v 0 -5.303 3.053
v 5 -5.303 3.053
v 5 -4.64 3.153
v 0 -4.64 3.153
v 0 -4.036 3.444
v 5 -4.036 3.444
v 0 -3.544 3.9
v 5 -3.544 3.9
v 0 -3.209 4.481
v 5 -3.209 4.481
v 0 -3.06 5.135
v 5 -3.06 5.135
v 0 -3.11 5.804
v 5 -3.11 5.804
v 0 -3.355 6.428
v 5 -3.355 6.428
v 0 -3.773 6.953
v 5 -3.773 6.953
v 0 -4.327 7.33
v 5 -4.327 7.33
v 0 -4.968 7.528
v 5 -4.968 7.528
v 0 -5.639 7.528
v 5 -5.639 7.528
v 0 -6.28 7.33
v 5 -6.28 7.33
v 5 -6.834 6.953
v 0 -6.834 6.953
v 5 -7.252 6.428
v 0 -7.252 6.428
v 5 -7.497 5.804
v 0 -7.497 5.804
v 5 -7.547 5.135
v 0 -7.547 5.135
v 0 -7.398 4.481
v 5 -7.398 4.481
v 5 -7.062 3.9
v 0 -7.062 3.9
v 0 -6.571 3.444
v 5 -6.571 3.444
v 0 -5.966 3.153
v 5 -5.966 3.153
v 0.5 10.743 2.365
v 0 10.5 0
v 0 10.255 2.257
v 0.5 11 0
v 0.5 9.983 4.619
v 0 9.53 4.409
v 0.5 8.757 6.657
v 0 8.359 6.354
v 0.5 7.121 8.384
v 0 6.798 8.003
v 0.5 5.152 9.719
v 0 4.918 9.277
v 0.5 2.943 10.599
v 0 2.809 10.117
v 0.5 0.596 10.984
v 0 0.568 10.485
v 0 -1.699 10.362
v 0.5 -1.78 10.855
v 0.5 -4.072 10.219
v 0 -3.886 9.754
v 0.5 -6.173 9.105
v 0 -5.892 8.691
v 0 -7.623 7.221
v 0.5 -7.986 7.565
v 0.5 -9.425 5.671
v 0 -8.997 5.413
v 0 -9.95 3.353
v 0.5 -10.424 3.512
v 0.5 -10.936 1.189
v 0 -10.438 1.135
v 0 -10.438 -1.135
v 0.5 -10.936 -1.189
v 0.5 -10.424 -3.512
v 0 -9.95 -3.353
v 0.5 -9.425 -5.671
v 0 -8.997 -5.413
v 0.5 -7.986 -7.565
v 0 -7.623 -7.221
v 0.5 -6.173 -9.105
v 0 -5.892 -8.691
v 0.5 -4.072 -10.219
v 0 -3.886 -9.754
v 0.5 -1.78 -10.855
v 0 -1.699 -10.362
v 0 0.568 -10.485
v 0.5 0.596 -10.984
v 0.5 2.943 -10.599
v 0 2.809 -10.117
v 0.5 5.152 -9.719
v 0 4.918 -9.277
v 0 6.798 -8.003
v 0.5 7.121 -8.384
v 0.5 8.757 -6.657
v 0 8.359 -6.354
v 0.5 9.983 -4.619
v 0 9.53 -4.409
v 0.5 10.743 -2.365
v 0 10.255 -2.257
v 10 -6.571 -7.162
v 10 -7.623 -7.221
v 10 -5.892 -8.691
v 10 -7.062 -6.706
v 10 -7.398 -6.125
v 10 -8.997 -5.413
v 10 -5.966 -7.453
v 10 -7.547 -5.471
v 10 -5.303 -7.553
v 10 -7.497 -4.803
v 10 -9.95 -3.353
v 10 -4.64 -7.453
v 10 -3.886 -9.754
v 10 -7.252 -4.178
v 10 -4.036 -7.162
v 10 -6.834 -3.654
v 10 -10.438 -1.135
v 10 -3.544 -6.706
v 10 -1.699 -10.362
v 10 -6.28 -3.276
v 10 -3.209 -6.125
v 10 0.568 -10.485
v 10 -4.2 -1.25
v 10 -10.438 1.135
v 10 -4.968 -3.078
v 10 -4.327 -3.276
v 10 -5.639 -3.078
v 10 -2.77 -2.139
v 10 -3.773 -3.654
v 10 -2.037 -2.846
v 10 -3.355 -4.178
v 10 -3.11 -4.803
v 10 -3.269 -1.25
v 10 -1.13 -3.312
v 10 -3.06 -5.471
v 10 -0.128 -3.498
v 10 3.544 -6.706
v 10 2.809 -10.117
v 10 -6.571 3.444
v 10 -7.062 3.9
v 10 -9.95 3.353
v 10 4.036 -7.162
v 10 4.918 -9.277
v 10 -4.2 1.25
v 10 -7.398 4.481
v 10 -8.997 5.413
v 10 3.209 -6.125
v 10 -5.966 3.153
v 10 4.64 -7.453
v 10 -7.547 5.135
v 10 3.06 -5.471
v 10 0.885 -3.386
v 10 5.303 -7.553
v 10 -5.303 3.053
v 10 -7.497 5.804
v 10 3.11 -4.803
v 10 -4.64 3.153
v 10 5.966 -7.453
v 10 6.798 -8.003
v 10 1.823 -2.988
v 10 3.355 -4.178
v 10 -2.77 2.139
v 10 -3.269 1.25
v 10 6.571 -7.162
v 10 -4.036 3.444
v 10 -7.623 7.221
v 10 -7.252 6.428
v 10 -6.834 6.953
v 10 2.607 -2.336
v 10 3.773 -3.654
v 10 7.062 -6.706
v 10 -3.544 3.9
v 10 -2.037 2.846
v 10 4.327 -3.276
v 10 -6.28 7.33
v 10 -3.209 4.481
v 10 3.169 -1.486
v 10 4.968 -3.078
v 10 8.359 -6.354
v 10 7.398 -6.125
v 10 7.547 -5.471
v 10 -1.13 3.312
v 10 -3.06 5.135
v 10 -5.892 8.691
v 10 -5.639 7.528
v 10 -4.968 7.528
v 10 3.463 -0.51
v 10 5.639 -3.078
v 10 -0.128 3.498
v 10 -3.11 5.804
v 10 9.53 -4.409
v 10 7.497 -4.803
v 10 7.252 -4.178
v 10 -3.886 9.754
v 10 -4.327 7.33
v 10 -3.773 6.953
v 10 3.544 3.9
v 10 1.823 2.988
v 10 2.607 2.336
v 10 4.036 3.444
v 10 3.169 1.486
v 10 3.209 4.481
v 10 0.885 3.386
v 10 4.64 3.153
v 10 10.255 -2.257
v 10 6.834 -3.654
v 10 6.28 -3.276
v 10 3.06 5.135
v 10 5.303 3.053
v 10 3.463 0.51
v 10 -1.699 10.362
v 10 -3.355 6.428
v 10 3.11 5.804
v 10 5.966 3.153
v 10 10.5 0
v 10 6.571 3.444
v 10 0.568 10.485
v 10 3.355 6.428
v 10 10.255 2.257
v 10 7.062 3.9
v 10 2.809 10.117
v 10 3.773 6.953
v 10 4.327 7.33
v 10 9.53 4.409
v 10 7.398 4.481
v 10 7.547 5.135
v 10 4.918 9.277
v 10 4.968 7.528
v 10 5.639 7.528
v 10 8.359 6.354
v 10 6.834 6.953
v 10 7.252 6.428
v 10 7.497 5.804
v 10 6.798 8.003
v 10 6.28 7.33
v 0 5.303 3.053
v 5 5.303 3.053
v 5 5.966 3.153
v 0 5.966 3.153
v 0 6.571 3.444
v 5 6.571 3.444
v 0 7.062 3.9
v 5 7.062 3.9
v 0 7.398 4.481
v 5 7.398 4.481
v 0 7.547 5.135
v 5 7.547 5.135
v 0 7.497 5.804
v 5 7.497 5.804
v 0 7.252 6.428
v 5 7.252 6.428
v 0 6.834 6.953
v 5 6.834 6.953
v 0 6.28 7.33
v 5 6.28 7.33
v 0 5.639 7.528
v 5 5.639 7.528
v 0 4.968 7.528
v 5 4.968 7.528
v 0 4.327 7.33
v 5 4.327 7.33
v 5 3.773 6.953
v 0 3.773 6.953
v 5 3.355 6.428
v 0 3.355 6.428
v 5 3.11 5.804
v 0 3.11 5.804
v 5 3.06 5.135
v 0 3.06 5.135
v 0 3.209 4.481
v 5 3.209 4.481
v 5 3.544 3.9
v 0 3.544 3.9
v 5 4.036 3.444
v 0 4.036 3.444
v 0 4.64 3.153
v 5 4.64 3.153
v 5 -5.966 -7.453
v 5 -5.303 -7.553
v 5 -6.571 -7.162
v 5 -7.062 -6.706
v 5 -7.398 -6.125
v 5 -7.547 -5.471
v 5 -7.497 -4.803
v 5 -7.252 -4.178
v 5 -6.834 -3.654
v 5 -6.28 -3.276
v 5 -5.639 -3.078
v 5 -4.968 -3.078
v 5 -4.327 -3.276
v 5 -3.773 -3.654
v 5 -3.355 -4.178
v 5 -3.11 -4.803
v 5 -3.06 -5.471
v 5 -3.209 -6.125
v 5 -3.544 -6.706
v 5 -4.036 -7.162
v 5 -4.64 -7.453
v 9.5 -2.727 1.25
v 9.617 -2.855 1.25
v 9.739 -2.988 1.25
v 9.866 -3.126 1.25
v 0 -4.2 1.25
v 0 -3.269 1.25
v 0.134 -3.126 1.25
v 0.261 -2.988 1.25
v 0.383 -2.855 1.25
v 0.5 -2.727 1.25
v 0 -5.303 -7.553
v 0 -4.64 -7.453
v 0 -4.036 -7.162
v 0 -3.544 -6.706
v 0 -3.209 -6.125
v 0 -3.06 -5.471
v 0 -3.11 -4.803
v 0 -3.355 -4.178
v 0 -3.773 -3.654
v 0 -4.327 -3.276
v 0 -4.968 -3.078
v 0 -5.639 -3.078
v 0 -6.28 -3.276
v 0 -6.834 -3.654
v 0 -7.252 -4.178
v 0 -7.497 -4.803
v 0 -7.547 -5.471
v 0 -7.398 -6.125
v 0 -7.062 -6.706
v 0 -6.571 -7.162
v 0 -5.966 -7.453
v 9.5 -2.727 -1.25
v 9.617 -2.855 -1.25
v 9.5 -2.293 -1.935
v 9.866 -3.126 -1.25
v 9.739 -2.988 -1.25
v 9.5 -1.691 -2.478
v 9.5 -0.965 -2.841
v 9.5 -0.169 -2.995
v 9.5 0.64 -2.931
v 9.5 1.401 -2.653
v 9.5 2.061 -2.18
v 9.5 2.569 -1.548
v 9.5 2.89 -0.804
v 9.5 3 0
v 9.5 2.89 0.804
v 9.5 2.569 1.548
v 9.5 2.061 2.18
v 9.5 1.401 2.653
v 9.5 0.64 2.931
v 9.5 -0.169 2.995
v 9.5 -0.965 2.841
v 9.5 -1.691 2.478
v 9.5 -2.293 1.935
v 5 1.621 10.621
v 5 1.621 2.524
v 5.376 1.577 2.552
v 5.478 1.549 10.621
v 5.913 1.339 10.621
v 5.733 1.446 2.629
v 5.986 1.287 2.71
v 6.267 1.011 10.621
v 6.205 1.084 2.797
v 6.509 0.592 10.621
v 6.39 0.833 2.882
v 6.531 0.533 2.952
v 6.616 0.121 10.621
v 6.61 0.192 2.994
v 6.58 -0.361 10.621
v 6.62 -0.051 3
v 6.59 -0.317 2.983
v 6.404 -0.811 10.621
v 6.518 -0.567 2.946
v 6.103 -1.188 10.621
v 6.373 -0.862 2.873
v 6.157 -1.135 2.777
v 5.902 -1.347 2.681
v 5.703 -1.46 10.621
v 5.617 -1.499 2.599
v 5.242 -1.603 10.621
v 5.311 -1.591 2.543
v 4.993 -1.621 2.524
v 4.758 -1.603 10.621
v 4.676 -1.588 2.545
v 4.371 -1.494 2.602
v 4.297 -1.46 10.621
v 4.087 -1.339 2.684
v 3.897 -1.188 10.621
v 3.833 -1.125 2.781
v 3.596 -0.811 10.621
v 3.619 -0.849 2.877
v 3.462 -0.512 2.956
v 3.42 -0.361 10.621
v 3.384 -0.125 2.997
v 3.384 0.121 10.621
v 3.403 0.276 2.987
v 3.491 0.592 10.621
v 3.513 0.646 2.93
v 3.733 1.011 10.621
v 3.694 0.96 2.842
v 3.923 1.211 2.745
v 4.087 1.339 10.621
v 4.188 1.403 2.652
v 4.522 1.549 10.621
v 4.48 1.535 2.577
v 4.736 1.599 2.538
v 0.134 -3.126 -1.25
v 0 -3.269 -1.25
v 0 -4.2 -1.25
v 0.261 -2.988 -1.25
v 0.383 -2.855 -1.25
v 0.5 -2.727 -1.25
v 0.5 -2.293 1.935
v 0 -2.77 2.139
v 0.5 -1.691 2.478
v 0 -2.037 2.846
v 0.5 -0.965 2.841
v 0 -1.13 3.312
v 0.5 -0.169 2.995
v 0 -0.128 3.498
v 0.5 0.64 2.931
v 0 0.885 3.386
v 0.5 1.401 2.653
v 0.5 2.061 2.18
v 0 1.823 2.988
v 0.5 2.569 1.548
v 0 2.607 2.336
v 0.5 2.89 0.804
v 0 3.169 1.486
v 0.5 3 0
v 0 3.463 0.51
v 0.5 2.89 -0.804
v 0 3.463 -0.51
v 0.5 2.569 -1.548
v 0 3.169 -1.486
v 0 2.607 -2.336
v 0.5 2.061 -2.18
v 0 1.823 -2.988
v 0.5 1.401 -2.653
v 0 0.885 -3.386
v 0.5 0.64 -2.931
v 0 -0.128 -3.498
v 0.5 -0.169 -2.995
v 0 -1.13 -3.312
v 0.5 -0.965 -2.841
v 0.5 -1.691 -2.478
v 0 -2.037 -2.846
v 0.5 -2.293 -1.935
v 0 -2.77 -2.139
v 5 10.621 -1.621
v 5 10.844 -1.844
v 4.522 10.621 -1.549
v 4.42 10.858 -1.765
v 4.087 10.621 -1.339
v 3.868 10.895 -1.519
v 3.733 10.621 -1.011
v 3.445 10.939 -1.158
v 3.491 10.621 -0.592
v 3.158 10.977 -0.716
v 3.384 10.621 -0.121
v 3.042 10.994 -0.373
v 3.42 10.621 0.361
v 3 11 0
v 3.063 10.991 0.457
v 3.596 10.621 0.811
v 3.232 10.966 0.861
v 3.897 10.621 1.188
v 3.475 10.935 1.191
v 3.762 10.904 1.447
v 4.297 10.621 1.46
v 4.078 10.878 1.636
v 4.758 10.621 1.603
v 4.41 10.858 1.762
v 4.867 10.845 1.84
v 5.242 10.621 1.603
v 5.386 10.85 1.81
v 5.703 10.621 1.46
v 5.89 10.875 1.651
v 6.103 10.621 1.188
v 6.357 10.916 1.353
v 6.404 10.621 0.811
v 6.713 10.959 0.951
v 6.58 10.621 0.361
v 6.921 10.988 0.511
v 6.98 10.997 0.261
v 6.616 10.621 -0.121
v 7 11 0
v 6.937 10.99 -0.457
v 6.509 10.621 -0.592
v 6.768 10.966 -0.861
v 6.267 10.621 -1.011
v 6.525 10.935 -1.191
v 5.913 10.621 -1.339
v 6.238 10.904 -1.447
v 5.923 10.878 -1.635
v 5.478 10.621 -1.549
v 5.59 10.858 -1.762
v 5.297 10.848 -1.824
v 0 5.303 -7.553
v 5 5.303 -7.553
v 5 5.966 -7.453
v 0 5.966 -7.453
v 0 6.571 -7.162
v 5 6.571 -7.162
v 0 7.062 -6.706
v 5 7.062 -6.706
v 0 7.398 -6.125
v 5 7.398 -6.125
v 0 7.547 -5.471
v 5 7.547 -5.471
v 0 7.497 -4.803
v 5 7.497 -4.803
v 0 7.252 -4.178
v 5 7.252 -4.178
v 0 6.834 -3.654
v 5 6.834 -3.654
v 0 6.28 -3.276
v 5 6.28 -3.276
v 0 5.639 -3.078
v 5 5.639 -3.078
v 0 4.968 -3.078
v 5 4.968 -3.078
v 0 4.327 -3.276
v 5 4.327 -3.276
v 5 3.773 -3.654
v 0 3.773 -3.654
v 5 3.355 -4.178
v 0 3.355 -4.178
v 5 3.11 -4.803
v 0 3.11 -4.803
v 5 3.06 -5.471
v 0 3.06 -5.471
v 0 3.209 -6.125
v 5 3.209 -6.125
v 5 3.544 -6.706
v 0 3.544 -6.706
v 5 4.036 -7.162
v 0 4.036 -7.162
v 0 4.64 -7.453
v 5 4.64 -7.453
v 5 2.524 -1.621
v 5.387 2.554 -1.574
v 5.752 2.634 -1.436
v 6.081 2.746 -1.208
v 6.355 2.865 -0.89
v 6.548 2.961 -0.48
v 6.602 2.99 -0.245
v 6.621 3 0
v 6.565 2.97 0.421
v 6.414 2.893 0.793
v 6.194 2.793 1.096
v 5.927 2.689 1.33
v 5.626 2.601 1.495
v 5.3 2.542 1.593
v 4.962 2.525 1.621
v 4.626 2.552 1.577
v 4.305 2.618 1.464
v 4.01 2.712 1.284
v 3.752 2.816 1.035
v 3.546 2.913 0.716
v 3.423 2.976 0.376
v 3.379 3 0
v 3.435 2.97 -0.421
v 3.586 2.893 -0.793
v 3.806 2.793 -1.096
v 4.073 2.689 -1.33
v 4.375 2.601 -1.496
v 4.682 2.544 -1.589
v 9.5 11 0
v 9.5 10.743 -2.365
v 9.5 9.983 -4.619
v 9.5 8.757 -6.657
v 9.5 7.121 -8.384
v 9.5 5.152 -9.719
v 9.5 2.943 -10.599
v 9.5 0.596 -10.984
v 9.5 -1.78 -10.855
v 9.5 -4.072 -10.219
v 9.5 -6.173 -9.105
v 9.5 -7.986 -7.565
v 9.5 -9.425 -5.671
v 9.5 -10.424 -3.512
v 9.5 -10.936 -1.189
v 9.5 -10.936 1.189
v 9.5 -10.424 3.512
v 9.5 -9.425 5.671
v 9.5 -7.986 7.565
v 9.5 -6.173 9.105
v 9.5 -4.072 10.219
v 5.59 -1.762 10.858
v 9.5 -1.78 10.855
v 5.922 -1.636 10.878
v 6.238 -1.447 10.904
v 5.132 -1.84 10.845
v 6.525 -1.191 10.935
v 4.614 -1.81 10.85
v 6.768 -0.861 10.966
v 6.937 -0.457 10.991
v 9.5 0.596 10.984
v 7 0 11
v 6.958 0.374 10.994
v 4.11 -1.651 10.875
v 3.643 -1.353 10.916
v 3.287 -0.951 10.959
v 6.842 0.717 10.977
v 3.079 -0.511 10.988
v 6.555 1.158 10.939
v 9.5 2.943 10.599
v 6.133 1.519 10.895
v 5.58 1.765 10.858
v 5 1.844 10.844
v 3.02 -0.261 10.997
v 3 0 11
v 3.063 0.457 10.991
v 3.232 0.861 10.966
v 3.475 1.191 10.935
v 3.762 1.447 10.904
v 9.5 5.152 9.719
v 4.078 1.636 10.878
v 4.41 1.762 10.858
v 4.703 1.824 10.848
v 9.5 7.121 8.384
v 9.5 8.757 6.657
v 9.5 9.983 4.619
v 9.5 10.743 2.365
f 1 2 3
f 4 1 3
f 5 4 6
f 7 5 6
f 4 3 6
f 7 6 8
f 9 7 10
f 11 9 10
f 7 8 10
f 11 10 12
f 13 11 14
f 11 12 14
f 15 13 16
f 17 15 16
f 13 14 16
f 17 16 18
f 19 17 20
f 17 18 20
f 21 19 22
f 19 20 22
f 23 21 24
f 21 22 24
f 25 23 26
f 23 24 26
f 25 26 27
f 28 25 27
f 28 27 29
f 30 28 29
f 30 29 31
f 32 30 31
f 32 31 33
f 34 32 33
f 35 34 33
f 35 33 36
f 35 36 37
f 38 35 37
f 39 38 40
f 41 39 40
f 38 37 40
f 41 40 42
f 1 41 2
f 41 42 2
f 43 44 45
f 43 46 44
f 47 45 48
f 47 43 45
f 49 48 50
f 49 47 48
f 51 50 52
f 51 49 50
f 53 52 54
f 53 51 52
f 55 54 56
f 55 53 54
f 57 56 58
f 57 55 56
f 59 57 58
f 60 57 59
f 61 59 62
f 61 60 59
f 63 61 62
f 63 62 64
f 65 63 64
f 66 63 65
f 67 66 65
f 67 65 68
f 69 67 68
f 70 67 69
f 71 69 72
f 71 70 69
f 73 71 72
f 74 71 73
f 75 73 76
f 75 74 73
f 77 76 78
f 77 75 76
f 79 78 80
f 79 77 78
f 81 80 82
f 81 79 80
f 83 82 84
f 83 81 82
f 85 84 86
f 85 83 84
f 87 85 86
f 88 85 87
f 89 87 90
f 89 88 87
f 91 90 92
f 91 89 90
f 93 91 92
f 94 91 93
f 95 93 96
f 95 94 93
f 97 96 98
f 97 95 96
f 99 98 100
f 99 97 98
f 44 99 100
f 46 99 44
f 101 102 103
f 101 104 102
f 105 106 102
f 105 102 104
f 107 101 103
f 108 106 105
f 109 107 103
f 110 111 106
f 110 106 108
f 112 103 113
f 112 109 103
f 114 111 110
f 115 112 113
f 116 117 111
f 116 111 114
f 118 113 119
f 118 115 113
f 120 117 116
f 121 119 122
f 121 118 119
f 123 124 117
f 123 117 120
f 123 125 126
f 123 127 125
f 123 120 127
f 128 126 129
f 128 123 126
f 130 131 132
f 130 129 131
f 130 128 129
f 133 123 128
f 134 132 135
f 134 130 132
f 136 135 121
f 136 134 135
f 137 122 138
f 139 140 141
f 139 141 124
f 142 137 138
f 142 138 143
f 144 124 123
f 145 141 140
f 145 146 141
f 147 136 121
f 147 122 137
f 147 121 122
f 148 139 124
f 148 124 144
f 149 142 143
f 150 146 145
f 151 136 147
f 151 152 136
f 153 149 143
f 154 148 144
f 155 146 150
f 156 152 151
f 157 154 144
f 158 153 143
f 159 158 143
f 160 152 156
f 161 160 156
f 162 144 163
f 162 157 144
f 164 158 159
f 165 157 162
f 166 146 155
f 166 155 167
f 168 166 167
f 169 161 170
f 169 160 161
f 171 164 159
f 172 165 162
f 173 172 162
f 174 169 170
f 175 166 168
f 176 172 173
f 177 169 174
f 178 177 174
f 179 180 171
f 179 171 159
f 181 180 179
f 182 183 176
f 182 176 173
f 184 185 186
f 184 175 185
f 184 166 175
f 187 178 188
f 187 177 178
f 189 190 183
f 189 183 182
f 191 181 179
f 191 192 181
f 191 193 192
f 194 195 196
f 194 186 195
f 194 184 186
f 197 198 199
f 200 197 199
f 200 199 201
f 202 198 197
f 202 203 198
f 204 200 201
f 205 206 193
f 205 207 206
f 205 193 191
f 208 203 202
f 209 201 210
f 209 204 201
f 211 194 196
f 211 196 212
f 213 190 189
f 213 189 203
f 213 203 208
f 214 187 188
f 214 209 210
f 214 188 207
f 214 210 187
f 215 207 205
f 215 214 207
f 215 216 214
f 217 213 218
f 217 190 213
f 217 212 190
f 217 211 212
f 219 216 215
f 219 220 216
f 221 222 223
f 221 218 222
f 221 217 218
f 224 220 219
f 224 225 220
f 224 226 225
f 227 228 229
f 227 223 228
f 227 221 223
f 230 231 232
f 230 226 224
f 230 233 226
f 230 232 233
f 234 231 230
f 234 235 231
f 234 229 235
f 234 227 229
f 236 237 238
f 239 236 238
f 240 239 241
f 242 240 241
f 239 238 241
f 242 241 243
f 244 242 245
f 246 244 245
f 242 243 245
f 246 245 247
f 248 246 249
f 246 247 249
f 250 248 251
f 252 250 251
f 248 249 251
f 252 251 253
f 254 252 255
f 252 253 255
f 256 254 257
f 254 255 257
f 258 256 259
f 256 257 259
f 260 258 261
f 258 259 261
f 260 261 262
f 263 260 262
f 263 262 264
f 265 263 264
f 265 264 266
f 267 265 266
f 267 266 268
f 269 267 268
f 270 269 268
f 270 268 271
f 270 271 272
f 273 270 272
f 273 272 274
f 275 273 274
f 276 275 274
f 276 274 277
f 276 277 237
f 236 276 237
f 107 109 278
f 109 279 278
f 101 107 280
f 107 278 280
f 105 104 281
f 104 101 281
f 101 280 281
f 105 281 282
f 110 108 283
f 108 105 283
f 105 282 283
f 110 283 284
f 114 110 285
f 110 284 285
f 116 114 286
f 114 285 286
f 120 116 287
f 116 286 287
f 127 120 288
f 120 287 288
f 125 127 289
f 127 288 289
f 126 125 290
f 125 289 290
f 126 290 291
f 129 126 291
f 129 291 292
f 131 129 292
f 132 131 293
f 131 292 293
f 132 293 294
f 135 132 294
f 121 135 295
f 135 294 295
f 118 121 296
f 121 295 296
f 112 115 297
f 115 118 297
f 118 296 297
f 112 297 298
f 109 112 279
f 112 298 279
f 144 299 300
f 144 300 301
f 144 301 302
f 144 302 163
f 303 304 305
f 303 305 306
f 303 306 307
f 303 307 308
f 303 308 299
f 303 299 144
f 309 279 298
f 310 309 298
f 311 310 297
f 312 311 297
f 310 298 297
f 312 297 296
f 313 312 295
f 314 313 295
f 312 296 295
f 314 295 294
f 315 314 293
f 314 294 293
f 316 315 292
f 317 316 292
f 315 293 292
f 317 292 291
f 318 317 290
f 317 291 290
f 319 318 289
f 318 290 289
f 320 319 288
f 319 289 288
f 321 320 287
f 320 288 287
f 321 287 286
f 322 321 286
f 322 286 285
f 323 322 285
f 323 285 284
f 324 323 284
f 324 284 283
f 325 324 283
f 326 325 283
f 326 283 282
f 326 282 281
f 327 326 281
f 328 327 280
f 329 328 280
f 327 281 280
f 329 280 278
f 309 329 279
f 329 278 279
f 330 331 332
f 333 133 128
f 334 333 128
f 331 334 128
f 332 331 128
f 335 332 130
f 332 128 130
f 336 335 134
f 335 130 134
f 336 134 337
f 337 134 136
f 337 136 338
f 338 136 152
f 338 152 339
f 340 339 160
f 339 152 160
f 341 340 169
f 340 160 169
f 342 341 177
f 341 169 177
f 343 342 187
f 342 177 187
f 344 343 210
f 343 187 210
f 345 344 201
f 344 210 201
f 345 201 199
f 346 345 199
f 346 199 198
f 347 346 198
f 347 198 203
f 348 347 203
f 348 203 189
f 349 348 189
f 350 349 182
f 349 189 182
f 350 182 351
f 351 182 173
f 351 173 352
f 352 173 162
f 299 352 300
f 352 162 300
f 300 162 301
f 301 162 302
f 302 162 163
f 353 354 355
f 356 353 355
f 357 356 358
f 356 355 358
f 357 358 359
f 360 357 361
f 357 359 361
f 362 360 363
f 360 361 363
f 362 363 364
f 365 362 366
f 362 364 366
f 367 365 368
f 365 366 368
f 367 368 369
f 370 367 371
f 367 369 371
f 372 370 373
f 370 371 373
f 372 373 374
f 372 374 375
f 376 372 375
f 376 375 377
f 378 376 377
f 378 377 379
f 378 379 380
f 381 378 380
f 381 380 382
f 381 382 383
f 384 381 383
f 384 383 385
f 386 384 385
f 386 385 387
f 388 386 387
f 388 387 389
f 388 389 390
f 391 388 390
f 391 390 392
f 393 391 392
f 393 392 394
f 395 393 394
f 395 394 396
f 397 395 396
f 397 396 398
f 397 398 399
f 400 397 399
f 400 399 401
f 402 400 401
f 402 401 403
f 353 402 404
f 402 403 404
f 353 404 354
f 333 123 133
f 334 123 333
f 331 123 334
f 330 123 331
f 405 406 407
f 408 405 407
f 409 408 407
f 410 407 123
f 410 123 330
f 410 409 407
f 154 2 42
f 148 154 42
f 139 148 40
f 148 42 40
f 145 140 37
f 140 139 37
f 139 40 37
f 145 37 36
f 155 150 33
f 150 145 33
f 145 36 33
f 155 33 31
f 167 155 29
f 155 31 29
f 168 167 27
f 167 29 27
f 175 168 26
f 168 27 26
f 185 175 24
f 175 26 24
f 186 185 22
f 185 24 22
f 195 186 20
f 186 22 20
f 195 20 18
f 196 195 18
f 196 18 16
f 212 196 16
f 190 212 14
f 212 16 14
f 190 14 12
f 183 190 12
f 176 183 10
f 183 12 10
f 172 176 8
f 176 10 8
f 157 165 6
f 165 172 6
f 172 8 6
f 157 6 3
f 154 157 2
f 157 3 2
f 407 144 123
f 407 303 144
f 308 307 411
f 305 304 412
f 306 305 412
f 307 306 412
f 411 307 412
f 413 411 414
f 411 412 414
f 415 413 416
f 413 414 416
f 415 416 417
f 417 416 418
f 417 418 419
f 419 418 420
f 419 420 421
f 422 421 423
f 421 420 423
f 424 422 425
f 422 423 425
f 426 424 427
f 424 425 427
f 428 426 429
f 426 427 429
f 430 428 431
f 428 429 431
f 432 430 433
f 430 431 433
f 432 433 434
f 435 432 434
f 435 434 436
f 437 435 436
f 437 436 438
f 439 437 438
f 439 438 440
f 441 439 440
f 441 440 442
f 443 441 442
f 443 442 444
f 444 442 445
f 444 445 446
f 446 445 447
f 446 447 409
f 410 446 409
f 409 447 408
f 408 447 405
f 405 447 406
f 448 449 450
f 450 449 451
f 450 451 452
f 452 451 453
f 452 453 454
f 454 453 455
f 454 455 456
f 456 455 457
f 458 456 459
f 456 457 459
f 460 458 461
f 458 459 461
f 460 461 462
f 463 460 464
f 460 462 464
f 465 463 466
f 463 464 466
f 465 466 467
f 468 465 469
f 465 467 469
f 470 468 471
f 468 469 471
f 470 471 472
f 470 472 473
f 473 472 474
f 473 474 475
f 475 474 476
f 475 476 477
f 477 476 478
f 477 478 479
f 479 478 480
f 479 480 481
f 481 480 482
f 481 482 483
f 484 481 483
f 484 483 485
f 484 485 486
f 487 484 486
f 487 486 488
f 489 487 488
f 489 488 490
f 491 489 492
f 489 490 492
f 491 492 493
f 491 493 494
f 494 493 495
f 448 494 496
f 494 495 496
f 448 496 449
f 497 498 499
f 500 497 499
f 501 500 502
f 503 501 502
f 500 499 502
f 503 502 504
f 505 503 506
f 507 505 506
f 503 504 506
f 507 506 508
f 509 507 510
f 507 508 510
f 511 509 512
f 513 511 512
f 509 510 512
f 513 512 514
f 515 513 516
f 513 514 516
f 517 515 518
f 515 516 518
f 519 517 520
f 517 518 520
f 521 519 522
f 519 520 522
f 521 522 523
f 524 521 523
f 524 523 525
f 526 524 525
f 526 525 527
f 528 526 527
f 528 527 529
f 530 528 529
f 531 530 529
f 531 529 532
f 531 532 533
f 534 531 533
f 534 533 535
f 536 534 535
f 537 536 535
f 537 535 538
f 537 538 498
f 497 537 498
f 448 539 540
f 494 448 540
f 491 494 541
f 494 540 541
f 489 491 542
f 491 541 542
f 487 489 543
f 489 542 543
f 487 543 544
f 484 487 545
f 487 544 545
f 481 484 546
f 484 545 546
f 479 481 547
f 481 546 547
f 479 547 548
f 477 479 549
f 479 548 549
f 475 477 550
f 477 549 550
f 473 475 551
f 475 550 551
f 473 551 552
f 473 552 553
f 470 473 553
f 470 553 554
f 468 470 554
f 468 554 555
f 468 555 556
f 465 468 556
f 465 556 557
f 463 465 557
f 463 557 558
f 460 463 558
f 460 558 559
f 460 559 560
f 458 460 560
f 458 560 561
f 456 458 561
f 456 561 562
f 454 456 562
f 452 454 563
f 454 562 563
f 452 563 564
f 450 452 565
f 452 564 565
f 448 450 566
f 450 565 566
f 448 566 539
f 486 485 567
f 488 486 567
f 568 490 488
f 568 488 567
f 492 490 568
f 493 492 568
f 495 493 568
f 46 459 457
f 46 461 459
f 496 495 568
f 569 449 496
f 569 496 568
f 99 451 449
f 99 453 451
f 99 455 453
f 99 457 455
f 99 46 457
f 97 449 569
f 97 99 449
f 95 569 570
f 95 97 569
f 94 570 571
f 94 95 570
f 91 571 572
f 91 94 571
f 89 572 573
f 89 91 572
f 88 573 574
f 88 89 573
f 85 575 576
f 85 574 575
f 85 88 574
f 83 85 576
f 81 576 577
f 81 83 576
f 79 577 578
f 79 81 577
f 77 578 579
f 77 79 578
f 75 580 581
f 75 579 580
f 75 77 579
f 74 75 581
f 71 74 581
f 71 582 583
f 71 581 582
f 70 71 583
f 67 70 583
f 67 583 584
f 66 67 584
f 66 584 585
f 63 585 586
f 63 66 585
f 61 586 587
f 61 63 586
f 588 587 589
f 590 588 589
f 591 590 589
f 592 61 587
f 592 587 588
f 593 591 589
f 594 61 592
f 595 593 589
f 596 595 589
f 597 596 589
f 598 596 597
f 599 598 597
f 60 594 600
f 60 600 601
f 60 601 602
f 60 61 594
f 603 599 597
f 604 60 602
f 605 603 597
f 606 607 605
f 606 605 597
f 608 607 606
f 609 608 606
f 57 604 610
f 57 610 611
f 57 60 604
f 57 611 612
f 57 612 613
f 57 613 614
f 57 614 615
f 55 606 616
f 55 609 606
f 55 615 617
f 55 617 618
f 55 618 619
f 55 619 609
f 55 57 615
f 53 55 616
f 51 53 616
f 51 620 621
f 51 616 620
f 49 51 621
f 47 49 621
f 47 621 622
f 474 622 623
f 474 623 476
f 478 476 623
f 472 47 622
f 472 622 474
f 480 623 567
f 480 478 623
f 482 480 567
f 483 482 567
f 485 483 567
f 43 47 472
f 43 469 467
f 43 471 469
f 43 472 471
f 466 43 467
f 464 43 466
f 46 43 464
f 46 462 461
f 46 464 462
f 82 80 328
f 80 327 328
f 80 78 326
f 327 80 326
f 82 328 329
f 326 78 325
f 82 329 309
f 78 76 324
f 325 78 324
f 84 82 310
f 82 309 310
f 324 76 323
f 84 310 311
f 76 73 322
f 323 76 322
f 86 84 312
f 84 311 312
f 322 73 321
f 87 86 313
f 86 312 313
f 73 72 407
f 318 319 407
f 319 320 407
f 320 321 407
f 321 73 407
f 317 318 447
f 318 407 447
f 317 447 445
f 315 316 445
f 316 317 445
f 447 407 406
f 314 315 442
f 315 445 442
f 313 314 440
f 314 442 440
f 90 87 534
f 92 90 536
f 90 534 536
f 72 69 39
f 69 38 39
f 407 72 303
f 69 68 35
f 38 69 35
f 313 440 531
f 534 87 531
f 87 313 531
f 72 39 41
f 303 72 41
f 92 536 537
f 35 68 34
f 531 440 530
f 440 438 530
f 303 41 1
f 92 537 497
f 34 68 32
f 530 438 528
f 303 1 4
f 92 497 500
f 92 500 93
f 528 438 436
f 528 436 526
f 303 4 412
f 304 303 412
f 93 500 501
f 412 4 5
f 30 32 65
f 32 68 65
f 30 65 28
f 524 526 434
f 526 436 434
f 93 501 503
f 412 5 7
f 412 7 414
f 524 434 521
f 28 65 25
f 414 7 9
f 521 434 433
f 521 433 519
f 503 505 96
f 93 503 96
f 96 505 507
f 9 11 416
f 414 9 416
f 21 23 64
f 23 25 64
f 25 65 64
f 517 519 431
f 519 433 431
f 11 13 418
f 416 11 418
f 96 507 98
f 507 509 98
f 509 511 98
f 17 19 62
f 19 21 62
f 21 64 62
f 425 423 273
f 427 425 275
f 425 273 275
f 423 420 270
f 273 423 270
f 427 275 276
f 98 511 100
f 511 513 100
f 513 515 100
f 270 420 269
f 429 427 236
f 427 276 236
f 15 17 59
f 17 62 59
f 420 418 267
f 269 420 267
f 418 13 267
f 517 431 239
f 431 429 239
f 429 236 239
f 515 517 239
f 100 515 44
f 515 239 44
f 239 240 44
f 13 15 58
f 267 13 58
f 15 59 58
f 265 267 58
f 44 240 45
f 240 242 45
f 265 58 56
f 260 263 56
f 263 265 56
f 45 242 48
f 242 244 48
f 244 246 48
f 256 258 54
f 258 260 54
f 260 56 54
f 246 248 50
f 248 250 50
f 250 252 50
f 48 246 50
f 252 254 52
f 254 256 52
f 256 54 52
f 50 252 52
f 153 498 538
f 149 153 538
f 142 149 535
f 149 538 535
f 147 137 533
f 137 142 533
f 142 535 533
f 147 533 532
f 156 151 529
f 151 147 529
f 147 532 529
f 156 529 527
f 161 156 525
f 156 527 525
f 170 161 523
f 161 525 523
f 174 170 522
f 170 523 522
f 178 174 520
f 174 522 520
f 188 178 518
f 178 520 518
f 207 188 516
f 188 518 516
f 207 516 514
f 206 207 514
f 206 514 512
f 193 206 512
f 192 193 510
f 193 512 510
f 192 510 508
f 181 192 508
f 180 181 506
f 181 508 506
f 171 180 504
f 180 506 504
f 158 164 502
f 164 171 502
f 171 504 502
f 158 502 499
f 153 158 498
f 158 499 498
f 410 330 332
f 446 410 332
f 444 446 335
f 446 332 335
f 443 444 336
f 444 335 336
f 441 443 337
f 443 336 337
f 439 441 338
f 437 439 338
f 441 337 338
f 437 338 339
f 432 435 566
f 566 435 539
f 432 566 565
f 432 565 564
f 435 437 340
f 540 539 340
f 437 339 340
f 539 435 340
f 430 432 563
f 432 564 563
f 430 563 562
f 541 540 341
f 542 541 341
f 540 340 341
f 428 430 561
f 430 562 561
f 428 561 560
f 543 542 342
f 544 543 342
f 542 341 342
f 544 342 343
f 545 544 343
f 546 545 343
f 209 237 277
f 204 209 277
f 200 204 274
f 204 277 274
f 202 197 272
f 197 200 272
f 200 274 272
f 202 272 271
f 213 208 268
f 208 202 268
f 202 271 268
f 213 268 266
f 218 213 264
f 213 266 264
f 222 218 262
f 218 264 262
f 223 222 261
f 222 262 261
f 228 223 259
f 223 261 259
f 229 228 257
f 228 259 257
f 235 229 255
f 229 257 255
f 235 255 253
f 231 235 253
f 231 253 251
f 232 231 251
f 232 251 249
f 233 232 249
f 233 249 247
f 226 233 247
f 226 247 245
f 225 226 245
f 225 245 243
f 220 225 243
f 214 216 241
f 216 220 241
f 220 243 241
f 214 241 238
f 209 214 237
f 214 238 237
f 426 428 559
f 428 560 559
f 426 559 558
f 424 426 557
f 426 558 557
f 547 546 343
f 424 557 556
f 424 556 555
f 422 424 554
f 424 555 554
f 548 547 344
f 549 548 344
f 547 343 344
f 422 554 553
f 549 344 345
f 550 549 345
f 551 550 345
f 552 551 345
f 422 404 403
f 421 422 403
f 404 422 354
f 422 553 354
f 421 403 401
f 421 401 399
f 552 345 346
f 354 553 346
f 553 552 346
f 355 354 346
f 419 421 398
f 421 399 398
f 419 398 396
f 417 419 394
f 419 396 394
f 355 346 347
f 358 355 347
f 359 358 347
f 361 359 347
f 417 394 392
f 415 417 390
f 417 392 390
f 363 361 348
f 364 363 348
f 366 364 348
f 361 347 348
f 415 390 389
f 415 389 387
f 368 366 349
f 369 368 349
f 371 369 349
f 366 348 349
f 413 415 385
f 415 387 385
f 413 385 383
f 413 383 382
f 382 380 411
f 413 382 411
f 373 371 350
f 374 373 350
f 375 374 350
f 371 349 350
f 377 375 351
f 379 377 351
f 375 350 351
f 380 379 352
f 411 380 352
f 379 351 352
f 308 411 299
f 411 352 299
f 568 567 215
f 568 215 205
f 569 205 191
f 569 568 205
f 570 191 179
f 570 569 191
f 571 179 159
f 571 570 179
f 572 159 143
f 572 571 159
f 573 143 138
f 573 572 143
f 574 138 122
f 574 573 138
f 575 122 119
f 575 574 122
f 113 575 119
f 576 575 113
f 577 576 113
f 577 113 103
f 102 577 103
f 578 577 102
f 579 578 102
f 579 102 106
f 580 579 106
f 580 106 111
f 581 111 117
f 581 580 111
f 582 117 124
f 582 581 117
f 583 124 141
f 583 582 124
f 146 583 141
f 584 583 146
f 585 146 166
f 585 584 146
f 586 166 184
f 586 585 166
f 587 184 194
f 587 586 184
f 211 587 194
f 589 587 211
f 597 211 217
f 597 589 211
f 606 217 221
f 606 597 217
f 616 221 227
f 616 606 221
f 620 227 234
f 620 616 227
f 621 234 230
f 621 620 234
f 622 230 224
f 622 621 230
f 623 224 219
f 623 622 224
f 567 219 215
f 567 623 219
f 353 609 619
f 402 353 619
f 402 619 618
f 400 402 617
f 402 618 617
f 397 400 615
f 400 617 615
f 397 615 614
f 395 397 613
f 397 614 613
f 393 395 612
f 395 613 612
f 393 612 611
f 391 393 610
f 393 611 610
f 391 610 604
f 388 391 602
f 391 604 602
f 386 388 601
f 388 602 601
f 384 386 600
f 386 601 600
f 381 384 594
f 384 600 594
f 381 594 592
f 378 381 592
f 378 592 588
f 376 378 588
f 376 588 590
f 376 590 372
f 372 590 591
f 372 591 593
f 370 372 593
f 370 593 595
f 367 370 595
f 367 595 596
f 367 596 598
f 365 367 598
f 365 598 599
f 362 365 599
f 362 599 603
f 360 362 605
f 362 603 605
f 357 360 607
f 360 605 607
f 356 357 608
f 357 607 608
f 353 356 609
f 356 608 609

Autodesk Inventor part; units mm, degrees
sketch "Sketch_1" plane through (0, 0, 0) normal (0, 0, 1) x (1, 0, 0)
  line L0 (10, 0) -> (0, 0)
  line L1 (0, 3.5) -> (0.5, 3)
  line L2 (0.5, 3) -> (9.5, 3)
  line L3 (9.5, 3) -> (10, 3.5)
  line L4 (10, 3.5) -> (10, 10.5)
  line L5 (10, 10.5) -> (9.5, 11)
  line L6 (9.5, 11) -> (0.5, 11)
  line L7 (0.5, 11) -> (0, 10.5)
  line L8 (0, 10.5) -> (0, 3.5)
revolve "Revolution1" add sketch "Sketch_1" angle 360 about axis through (10, 0, 0) along (1, 0, 0)
sketch "Sketch_4" plane through (5, 0, 0) normal (1, 0, 0) x (0, 0, -1)
  line L0 (0, 1.5) -> (0, 11)
  line L1 (0, 11) -> (2, 11)
  line L2 (2, 11) -> (1.621, 10.621)
  line L3 (1.621, 10.621) -> (1.621, 1.5)
  line L4 (1.621, 1.5) -> (0, 1.5)
  line L5 (0, 1.5) -> (0, 11)
revolve "Revolution2" cut sketch "Sketch_4" angle 360 about axis through (5, 1.5, 0) along (0, -1, 0)
thread "Thread1" size "M4x0.7" class "6H" standard "ISO Metric profile" length 7.621
sketch "Sketch_3" plane through (5, 0, 0) normal (1, 0, 0) x (0, 0, -1)
  line L0 (-1.5, 0) -> (-11, 0)
  line L1 (-11, 0) -> (-11, 2)
  line L2 (-11, 2) -> (-10.621, 1.621)
  line L3 (-10.621, 1.621) -> (-1.5, 1.621)
  line L4 (-1.5, 1.621) -> (-1.5, 0)
  line L5 (-1.5, 0) -> (-11, 0)
revolve "Revolution3" cut sketch "Sketch_3" angle 360 about axis through (5, 0, 1.5) along (0, 0, -1)
thread "Thread2" size "M4x0.7" class "6H" standard "ISO Metric profile" length 7.621
sketch "Sketch_2" plane through (5, 0, 0) normal (1, 0, 0) x (0, 0, -1)
  line L0 (-1.25, 0) -> (-1.25, -4.2)
  line L1 (-1.25, -4.2) -> (1.25, -4.2)
  line L2 (1.25, -4.2) -> (1.25, 0)
  line L3 (1.25, 0) -> (-1.25, 0)
extrude "Extrusion1" cut sketch "Sketch_2" along normal mid plane 10
sketch "Sketch_6" plane through (5, 0, 0) normal (1, 0, 0) x (0, 0, -1)
  circle A0 centre (5.3033, 5.3033) radius 2.25
extrude "Extrusion2" cut sketch "Sketch_6" along normal mid plane 10
sketch "Sketch_7" plane through (5, 0, 0) normal (1, 0, 0) x (0, 0, -1)
  circle A0 centre (-5.3033, 5.3033) radius 2.25
extrude "Extrusion3" cut sketch "Sketch_7" along normal mid plane 10
sketch "Sketch_8" plane through (5, 0, 0) normal (1, 0, 0) x (0, 0, -1)
  circle A0 centre (-5.3033, -5.3033) radius 2.25
extrude "Extrusion4" cut sketch "Sketch_8" along normal mid plane 10
sketch "Sketch_9" plane through (5, 0, 0) normal (1, 0, 0) x (0, 0, -1)
  circle A0 centre (5.3033, -5.3033) radius 2.25
extrude "Extrusion5" cut sketch "Sketch_9" along normal mid plane 10
ref_plane "part_XY" through (0, 0, 0) normal (-1, 0, 0) x (0, 0, -1)
ref_plane "part_YZ" through (0, 0, 0) normal (0, 0, -1) x (0, -1, 0)
ref_plane "part_ZX" through (0, 0, 0) normal (0, -1, 0) x (-1, 0, 0)
properties part number "SC  0610CKP4"
